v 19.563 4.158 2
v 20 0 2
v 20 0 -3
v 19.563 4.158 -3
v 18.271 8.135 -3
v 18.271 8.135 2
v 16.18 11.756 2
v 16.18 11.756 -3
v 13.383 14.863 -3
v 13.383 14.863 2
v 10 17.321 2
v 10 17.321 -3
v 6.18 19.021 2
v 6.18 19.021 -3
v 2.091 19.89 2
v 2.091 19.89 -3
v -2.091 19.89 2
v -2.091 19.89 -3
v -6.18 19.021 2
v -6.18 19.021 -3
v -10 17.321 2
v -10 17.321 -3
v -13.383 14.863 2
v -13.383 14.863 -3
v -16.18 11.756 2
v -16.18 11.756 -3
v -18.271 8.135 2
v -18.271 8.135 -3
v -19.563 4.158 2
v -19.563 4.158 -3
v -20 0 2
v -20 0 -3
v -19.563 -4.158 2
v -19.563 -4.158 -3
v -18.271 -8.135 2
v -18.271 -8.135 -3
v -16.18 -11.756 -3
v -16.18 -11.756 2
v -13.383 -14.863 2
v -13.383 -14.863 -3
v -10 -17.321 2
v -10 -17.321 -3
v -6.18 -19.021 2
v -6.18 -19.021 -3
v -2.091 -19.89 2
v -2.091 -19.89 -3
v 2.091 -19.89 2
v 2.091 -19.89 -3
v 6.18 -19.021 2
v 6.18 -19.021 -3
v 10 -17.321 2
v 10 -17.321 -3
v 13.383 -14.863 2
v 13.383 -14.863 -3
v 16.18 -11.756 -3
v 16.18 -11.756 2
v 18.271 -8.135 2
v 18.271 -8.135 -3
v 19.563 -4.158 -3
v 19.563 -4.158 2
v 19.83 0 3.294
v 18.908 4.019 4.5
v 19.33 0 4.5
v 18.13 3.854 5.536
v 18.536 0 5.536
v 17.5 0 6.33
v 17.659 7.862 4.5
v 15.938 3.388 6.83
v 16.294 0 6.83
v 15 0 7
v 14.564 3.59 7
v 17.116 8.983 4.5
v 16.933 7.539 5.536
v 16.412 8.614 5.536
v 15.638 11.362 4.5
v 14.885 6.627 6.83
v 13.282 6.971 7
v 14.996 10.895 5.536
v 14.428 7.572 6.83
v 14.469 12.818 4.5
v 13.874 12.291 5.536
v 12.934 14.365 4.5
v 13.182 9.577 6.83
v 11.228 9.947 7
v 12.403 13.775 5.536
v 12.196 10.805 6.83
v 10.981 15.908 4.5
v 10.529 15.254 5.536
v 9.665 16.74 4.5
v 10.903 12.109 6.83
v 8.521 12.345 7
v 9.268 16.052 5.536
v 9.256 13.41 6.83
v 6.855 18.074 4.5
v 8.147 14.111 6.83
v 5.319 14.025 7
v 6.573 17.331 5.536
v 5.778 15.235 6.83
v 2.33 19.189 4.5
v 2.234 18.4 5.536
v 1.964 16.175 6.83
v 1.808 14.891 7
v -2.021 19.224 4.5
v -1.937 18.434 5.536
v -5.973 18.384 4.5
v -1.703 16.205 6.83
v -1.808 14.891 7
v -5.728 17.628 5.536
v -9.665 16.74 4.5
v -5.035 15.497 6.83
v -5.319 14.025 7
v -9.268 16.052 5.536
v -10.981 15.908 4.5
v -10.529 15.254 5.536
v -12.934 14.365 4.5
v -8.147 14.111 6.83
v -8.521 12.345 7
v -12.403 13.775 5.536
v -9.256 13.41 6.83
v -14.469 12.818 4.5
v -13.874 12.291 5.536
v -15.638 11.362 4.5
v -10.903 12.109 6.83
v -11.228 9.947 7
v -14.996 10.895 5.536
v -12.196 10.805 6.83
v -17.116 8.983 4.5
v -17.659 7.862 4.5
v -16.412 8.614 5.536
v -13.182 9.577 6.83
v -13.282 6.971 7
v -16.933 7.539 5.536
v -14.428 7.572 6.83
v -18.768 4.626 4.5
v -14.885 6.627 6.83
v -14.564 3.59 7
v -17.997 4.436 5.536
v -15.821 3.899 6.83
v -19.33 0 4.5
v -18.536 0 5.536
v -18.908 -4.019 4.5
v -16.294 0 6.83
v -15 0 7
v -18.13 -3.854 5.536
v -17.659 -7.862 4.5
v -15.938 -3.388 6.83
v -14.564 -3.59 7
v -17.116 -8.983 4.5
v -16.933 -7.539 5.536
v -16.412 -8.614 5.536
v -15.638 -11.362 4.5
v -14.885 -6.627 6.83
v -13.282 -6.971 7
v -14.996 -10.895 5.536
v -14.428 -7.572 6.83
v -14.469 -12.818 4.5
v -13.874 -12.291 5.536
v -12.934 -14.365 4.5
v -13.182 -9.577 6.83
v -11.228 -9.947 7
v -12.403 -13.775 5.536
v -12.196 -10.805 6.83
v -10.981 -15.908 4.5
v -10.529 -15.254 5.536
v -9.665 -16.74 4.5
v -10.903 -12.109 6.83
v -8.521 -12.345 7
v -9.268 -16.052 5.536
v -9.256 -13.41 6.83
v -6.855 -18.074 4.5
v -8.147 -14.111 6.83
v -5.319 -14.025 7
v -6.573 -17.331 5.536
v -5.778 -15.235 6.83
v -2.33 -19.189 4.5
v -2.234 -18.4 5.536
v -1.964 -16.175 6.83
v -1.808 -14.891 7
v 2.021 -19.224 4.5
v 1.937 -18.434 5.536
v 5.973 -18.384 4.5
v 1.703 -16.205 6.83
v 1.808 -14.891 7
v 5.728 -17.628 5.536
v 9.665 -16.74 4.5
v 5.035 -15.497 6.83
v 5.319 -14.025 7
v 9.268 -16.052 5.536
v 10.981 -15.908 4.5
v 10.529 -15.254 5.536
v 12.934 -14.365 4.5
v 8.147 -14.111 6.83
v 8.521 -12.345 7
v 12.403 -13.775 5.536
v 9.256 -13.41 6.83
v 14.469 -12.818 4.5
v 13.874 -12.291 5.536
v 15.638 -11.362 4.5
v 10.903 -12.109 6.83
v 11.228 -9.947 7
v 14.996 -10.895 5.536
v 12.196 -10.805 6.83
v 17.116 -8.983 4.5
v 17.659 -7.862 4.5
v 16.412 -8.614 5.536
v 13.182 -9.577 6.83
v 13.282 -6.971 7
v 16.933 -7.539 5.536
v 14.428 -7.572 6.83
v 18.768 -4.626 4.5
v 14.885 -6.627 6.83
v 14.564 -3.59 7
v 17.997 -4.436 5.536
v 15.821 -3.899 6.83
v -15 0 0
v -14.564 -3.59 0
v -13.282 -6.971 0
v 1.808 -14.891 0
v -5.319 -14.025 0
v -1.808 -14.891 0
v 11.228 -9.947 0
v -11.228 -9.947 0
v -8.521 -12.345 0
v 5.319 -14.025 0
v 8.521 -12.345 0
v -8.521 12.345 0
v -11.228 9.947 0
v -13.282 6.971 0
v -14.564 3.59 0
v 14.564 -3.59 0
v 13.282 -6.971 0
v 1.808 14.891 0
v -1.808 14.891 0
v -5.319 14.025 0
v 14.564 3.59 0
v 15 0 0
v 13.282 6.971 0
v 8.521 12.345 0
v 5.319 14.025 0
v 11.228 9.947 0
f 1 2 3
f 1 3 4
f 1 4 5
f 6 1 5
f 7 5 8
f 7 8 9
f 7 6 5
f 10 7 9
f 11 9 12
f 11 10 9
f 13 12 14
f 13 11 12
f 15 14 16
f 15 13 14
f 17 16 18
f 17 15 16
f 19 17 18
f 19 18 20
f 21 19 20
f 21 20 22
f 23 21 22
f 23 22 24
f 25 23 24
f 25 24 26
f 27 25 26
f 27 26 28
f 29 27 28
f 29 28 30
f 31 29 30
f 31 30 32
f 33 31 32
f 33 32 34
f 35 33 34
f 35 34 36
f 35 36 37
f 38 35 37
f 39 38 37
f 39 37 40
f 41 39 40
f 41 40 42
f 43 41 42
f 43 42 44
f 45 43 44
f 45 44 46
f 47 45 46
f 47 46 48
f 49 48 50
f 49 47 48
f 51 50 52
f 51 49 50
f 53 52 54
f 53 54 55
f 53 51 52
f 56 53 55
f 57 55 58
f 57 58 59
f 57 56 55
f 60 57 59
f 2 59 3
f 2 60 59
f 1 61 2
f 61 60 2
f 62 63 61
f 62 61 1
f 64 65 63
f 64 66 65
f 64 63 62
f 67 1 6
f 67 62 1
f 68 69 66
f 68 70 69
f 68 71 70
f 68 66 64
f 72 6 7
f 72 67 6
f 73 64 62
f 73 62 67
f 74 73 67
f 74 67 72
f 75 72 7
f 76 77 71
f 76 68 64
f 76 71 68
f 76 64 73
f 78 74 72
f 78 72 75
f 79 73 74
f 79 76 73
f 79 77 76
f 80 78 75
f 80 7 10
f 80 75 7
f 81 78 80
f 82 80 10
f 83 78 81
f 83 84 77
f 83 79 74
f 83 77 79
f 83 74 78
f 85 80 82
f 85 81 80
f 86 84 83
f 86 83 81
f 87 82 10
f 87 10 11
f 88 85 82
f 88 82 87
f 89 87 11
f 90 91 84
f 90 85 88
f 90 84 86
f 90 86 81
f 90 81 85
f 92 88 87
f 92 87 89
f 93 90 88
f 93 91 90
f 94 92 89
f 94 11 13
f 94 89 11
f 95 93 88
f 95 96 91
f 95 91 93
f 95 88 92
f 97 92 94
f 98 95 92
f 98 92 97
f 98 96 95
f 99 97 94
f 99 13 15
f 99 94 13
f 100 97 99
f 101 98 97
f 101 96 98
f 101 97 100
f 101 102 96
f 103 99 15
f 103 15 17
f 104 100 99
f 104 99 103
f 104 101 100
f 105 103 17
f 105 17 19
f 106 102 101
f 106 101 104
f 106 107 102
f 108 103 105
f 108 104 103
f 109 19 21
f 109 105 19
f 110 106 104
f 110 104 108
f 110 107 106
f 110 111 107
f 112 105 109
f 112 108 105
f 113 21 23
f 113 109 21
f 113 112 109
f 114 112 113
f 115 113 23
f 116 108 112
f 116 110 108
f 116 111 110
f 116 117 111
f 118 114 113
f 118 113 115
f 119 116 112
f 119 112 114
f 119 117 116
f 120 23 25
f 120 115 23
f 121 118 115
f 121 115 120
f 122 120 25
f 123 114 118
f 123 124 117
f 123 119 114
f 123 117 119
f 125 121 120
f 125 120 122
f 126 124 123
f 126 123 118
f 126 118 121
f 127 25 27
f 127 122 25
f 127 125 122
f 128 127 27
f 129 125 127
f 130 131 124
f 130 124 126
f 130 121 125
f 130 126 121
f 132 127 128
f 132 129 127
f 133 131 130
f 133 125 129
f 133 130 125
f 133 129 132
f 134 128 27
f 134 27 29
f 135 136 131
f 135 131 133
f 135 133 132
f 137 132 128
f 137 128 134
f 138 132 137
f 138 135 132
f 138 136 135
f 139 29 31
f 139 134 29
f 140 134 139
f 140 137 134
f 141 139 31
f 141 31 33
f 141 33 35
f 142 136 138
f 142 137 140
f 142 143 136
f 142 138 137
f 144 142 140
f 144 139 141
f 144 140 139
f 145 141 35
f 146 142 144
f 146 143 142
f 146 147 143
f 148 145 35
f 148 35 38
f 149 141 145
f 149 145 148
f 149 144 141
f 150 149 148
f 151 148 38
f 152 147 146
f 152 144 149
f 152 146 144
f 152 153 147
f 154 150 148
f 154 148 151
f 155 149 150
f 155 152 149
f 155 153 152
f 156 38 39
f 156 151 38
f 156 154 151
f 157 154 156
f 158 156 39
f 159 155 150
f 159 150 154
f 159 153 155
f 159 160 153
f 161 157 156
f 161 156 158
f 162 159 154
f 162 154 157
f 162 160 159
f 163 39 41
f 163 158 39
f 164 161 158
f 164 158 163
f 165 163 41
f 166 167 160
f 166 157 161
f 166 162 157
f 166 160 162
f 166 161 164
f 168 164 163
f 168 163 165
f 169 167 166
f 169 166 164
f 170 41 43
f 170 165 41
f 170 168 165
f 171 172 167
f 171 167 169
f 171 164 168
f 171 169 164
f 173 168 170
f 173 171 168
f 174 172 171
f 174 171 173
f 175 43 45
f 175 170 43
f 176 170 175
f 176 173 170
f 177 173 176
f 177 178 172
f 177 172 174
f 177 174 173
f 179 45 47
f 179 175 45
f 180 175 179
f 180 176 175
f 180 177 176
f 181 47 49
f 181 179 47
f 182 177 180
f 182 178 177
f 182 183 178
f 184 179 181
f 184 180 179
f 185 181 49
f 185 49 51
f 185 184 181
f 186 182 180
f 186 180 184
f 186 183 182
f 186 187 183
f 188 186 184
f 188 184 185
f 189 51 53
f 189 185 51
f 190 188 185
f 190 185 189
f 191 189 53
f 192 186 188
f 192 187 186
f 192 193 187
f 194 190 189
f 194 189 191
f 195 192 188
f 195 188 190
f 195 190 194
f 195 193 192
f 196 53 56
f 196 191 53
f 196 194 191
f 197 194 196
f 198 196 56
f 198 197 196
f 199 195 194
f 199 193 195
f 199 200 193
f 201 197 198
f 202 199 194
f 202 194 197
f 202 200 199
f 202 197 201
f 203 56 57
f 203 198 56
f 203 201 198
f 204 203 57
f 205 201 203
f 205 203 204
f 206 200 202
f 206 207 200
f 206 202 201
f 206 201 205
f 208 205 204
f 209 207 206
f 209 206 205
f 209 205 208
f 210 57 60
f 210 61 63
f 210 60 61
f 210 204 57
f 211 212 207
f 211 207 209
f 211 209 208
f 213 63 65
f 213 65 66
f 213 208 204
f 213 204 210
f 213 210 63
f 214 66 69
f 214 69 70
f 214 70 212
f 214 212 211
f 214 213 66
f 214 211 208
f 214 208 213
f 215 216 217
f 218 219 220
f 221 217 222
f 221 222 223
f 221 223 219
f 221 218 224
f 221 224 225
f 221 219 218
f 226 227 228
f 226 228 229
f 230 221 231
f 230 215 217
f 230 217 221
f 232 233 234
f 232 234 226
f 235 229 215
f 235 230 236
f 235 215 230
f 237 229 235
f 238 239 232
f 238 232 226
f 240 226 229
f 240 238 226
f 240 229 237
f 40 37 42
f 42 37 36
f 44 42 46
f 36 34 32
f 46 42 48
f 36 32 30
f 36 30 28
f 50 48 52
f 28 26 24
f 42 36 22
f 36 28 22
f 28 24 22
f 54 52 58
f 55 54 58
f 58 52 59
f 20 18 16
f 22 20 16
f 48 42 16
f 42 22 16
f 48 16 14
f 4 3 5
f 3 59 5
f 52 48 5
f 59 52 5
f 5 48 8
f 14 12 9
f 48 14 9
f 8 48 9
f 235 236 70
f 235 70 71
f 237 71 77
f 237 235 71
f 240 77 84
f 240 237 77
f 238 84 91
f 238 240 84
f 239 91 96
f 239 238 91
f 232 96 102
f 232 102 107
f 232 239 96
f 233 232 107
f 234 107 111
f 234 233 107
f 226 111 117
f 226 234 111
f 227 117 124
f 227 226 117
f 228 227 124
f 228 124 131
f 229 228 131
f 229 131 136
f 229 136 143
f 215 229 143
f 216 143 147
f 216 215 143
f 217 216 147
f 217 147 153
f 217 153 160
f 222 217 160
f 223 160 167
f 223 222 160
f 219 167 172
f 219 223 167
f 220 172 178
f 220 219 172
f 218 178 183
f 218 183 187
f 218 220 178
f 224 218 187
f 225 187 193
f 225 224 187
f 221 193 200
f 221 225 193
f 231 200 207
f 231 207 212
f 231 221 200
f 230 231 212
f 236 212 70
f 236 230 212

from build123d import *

# Parameters (mm, degrees)
F0_R     = 20
F0_R_2   = 15
F1_DEPTH = 7
F2_R     = 20
F3_DEPTH = 3
F4_R     = 4.99999


# Not quite as in the source:
# - a fillet or chamfer is up to 0.001 mm smaller than in the source, because OpenCascade refuses the exact size


with BuildPart() as f1:
    # F0 (on Top) → F1 (new body)
    with BuildSketch(Plane.XY):
        Circle(F0_R)
        Circle(F0_R_2, mode=Mode.SUBTRACT)
    extrude(amount=F1_DEPTH)

    # F2 (on Top) → F3 (join)
    with BuildSketch(Plane.XY):
        Circle(F2_R)
    extrude(amount=-F3_DEPTH)

    # F4 (radius 5 in the source; OpenCascade refuses exactly that, so slightly less here)
    f4_edges = [f1.edges().sort_by_distance(p)[0] for p in [
        (-20, 0, 7),
    ]]
    fillet(f4_edges, radius=F4_R)


solid = f1.part
